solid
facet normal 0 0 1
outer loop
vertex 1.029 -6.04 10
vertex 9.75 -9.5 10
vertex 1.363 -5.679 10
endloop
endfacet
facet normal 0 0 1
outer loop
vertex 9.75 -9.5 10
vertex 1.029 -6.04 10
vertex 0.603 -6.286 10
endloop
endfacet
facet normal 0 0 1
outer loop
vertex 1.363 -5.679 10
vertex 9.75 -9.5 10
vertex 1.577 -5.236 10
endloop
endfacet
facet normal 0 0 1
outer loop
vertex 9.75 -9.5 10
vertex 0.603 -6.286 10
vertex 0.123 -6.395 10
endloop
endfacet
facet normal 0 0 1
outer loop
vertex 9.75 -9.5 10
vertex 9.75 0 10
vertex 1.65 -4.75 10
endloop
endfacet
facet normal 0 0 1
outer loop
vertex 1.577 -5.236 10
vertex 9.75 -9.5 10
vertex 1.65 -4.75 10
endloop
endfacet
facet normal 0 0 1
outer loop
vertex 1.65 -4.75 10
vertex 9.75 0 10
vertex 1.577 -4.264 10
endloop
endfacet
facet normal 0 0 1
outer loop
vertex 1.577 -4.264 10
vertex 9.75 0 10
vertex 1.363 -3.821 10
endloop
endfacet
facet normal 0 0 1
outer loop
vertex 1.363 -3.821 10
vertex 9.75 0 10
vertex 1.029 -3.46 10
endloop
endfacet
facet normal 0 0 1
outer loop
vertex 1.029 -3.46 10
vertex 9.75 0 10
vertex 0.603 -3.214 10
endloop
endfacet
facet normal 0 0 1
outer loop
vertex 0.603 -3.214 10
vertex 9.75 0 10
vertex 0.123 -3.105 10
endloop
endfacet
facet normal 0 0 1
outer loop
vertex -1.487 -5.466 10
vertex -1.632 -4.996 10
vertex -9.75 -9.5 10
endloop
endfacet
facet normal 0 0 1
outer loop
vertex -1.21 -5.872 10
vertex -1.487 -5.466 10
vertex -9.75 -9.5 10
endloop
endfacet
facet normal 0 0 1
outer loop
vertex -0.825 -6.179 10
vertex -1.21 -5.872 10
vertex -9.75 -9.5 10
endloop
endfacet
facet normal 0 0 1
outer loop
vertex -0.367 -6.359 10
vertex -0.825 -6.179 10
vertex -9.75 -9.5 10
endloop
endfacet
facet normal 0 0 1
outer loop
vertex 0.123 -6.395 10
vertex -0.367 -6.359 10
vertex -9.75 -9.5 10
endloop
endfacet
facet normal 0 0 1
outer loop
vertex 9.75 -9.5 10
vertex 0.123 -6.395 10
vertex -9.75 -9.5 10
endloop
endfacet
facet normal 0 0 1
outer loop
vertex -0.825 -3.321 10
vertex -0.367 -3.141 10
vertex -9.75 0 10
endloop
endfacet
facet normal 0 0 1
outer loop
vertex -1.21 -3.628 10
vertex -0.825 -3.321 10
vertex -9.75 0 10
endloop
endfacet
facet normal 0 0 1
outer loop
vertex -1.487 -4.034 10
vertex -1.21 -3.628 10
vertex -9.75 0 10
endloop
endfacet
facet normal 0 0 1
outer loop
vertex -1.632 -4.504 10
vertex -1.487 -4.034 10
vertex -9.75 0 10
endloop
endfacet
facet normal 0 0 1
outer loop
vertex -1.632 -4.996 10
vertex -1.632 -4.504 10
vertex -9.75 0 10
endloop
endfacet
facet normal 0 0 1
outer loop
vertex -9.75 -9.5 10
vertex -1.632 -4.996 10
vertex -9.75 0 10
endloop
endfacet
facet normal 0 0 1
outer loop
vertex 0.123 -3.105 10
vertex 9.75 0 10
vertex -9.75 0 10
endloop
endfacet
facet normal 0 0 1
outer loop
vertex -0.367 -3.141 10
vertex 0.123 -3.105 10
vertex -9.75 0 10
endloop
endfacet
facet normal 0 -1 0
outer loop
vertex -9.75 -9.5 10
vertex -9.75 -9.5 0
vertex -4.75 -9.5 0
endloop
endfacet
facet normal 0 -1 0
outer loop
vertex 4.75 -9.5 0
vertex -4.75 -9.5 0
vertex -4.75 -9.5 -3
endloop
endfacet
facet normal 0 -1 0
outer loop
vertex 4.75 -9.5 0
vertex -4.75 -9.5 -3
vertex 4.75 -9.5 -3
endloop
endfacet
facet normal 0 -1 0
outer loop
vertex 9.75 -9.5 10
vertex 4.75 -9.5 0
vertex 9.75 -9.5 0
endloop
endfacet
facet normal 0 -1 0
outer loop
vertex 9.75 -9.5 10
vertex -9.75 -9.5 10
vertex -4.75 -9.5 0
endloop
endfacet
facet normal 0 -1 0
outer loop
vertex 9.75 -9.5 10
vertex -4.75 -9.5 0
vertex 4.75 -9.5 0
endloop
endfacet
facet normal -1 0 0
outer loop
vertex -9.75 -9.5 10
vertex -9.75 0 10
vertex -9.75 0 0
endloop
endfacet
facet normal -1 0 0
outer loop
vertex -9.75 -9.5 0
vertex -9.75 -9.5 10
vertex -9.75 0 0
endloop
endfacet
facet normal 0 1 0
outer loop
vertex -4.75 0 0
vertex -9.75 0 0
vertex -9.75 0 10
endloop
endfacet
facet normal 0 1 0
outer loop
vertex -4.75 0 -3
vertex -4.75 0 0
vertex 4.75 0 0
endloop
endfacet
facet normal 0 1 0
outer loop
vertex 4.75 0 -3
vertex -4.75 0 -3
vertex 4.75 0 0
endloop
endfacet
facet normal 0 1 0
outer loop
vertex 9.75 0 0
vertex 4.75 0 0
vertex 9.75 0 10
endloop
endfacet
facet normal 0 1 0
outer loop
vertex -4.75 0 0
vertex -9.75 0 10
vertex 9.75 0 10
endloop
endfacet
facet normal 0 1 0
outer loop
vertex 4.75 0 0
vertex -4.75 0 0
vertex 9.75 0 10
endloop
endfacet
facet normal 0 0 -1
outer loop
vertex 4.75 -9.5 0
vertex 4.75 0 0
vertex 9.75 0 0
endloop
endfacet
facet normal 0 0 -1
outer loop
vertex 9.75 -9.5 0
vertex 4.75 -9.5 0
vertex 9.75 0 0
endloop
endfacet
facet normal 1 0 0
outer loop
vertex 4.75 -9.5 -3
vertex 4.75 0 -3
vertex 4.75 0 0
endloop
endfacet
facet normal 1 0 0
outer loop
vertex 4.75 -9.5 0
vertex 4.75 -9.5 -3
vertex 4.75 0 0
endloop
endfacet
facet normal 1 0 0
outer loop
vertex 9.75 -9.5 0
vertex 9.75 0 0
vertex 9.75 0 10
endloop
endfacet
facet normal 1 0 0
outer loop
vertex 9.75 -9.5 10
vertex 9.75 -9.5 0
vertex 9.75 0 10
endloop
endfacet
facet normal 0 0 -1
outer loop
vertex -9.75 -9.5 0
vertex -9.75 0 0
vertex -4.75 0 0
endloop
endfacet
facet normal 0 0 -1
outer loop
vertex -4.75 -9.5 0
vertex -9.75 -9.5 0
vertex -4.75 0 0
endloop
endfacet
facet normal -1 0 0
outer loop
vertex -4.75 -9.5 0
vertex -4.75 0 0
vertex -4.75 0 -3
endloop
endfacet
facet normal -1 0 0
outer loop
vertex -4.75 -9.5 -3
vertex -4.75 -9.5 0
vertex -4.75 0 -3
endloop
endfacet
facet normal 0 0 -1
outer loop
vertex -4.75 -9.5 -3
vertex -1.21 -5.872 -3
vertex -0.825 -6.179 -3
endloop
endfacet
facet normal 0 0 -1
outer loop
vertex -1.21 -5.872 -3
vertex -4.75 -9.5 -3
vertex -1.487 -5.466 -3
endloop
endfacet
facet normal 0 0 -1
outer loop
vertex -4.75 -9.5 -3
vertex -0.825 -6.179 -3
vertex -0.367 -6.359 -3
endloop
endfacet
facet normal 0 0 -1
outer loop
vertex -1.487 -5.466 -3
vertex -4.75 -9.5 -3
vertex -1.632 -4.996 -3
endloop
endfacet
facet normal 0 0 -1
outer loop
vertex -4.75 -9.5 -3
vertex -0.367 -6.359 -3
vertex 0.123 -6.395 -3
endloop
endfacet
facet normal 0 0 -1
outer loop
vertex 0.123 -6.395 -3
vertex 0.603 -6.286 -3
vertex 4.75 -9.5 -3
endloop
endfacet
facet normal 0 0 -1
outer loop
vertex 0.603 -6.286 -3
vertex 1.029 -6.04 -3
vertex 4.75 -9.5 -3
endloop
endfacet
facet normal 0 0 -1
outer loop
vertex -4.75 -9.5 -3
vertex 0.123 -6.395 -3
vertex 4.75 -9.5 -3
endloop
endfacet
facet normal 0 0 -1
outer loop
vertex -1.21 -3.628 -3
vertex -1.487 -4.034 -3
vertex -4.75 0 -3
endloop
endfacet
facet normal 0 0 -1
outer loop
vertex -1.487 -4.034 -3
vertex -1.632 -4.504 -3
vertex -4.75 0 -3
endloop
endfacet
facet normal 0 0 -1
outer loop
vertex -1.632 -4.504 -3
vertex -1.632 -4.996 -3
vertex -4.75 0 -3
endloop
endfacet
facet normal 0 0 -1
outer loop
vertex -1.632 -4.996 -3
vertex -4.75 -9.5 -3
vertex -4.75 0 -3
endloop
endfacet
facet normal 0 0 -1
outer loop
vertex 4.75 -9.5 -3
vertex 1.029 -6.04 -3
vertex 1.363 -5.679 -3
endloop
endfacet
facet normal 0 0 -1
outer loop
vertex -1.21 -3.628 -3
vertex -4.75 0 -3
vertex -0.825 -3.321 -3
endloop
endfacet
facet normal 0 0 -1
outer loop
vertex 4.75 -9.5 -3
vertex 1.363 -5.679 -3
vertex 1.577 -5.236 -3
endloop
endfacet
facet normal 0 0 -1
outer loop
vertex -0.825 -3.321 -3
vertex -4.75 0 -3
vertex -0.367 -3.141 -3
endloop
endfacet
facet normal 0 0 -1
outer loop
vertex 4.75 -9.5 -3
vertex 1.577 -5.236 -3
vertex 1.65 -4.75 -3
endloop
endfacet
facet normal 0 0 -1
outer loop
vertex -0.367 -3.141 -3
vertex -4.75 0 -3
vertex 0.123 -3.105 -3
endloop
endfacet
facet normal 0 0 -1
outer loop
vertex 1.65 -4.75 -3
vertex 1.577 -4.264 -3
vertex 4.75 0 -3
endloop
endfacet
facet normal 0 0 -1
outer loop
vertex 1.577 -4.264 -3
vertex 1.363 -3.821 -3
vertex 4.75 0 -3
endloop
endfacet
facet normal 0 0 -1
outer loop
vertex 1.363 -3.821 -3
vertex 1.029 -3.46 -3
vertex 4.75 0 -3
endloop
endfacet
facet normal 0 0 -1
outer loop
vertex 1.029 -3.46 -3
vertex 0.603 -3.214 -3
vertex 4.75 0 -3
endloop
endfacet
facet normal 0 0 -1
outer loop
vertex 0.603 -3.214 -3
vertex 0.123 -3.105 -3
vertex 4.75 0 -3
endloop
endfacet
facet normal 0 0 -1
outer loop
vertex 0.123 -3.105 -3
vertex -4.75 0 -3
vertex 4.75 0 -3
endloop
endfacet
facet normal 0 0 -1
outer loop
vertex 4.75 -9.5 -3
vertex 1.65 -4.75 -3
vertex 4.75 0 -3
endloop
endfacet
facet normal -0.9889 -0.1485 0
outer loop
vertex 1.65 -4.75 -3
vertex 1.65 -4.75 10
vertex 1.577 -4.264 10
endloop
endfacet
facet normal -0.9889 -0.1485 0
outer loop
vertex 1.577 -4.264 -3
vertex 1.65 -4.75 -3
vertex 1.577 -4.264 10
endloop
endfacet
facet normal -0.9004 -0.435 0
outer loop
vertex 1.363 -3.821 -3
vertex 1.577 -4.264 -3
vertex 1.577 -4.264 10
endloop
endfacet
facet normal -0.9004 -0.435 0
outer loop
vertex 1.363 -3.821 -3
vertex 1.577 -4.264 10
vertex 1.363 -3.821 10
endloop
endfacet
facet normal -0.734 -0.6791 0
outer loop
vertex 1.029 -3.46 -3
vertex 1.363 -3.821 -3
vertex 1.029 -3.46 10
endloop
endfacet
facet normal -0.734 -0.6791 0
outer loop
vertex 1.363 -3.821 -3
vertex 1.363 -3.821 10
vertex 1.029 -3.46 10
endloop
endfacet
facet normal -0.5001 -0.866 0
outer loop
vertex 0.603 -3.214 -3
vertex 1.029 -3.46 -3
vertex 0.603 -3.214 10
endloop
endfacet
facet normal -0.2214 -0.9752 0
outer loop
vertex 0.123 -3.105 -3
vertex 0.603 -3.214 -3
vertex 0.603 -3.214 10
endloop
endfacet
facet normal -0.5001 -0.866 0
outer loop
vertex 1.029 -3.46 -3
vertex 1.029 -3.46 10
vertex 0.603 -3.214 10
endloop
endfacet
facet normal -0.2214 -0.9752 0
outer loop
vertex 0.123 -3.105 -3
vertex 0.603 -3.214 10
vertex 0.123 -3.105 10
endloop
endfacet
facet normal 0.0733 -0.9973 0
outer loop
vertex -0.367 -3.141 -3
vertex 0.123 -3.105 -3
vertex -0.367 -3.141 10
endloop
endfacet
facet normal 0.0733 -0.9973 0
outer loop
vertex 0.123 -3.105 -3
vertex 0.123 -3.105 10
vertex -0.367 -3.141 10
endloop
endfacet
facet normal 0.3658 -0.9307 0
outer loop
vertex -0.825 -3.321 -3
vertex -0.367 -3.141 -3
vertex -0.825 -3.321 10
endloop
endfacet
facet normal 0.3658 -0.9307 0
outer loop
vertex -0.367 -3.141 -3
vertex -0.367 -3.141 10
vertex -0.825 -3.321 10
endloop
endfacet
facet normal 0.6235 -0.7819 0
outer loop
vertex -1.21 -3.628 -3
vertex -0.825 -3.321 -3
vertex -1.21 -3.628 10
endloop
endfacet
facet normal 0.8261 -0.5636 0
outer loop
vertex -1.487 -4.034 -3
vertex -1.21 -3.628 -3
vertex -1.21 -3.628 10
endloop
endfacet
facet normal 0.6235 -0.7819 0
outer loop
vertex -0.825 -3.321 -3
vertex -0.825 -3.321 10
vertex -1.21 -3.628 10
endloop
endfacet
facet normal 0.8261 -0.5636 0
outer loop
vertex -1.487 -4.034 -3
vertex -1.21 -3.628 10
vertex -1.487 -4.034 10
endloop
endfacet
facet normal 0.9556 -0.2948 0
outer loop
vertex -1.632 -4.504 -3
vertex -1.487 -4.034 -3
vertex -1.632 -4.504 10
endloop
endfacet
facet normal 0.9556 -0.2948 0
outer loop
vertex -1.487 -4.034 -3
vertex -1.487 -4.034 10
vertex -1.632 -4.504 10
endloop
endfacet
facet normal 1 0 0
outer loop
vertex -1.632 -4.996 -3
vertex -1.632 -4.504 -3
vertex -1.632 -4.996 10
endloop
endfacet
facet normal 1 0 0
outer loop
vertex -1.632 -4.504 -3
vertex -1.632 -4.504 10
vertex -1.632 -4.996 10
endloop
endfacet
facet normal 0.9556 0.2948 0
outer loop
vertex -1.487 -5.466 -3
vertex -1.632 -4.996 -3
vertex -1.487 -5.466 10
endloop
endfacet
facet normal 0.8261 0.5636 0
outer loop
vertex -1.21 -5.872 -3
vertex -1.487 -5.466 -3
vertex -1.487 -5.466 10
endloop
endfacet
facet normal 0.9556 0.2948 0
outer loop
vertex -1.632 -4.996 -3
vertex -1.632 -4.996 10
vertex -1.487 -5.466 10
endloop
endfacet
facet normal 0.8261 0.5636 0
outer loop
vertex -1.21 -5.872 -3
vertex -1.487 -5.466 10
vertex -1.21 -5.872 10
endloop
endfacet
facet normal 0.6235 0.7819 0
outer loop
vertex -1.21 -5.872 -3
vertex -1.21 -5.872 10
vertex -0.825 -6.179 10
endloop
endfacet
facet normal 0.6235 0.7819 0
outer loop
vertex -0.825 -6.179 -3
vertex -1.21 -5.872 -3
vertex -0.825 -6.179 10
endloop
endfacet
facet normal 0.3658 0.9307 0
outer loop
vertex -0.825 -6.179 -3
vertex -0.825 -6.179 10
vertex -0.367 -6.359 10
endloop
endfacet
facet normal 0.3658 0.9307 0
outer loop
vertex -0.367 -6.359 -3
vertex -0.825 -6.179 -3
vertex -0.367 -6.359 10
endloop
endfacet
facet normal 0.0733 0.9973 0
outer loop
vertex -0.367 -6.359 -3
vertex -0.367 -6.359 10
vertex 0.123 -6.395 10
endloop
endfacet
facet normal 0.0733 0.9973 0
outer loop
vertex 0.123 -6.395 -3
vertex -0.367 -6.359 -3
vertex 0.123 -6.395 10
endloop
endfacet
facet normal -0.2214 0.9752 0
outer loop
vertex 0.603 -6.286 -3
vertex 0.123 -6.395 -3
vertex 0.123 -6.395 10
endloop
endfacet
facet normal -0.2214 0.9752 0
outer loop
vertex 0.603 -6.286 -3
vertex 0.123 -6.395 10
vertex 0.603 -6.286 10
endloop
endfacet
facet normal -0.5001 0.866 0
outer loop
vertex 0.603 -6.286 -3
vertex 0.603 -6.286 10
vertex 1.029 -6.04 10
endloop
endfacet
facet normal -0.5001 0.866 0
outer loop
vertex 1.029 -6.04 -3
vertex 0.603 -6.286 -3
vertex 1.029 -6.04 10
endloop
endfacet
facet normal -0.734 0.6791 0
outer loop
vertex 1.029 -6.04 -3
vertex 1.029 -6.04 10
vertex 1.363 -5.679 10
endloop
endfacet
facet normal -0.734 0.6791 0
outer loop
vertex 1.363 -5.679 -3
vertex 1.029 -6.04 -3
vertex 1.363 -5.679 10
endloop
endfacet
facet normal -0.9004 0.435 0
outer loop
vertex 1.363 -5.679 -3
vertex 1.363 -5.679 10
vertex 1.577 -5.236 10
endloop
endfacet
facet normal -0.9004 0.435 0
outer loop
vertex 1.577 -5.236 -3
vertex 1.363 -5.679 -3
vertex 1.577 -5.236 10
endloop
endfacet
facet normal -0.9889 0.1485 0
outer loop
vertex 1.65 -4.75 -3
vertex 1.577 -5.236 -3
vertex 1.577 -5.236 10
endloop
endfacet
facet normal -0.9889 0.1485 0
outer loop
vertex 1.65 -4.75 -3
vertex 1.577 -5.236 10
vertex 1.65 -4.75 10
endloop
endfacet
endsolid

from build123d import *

# Parameters (mm, degrees)
F1_DEPTH = 9.5
F2_R     = 1.65
F3_DEPTH = 13.001


with BuildPart() as f1:
    # F0 (on Front) → F1 (new body)
    with BuildSketch(Plane.XZ):
        Polygon((9.75, 10), (0, 10), (-9.75, 10), (-9.75, 0), (-4.75, 0), (-4.75, -3), (0, -3), (4.75, -3), (4.75, 0), (9.75, 0), align=None)
    extrude(amount=F1_DEPTH)

    # F2 (on face) → F3 (cut, through all)
    with BuildSketch(Plane.XY.offset(10)):
        with Locations((0, -4.75)):
            Circle(F2_R)
    extrude(amount=-F3_DEPTH, mode=Mode.SUBTRACT)


solid = f1.part
